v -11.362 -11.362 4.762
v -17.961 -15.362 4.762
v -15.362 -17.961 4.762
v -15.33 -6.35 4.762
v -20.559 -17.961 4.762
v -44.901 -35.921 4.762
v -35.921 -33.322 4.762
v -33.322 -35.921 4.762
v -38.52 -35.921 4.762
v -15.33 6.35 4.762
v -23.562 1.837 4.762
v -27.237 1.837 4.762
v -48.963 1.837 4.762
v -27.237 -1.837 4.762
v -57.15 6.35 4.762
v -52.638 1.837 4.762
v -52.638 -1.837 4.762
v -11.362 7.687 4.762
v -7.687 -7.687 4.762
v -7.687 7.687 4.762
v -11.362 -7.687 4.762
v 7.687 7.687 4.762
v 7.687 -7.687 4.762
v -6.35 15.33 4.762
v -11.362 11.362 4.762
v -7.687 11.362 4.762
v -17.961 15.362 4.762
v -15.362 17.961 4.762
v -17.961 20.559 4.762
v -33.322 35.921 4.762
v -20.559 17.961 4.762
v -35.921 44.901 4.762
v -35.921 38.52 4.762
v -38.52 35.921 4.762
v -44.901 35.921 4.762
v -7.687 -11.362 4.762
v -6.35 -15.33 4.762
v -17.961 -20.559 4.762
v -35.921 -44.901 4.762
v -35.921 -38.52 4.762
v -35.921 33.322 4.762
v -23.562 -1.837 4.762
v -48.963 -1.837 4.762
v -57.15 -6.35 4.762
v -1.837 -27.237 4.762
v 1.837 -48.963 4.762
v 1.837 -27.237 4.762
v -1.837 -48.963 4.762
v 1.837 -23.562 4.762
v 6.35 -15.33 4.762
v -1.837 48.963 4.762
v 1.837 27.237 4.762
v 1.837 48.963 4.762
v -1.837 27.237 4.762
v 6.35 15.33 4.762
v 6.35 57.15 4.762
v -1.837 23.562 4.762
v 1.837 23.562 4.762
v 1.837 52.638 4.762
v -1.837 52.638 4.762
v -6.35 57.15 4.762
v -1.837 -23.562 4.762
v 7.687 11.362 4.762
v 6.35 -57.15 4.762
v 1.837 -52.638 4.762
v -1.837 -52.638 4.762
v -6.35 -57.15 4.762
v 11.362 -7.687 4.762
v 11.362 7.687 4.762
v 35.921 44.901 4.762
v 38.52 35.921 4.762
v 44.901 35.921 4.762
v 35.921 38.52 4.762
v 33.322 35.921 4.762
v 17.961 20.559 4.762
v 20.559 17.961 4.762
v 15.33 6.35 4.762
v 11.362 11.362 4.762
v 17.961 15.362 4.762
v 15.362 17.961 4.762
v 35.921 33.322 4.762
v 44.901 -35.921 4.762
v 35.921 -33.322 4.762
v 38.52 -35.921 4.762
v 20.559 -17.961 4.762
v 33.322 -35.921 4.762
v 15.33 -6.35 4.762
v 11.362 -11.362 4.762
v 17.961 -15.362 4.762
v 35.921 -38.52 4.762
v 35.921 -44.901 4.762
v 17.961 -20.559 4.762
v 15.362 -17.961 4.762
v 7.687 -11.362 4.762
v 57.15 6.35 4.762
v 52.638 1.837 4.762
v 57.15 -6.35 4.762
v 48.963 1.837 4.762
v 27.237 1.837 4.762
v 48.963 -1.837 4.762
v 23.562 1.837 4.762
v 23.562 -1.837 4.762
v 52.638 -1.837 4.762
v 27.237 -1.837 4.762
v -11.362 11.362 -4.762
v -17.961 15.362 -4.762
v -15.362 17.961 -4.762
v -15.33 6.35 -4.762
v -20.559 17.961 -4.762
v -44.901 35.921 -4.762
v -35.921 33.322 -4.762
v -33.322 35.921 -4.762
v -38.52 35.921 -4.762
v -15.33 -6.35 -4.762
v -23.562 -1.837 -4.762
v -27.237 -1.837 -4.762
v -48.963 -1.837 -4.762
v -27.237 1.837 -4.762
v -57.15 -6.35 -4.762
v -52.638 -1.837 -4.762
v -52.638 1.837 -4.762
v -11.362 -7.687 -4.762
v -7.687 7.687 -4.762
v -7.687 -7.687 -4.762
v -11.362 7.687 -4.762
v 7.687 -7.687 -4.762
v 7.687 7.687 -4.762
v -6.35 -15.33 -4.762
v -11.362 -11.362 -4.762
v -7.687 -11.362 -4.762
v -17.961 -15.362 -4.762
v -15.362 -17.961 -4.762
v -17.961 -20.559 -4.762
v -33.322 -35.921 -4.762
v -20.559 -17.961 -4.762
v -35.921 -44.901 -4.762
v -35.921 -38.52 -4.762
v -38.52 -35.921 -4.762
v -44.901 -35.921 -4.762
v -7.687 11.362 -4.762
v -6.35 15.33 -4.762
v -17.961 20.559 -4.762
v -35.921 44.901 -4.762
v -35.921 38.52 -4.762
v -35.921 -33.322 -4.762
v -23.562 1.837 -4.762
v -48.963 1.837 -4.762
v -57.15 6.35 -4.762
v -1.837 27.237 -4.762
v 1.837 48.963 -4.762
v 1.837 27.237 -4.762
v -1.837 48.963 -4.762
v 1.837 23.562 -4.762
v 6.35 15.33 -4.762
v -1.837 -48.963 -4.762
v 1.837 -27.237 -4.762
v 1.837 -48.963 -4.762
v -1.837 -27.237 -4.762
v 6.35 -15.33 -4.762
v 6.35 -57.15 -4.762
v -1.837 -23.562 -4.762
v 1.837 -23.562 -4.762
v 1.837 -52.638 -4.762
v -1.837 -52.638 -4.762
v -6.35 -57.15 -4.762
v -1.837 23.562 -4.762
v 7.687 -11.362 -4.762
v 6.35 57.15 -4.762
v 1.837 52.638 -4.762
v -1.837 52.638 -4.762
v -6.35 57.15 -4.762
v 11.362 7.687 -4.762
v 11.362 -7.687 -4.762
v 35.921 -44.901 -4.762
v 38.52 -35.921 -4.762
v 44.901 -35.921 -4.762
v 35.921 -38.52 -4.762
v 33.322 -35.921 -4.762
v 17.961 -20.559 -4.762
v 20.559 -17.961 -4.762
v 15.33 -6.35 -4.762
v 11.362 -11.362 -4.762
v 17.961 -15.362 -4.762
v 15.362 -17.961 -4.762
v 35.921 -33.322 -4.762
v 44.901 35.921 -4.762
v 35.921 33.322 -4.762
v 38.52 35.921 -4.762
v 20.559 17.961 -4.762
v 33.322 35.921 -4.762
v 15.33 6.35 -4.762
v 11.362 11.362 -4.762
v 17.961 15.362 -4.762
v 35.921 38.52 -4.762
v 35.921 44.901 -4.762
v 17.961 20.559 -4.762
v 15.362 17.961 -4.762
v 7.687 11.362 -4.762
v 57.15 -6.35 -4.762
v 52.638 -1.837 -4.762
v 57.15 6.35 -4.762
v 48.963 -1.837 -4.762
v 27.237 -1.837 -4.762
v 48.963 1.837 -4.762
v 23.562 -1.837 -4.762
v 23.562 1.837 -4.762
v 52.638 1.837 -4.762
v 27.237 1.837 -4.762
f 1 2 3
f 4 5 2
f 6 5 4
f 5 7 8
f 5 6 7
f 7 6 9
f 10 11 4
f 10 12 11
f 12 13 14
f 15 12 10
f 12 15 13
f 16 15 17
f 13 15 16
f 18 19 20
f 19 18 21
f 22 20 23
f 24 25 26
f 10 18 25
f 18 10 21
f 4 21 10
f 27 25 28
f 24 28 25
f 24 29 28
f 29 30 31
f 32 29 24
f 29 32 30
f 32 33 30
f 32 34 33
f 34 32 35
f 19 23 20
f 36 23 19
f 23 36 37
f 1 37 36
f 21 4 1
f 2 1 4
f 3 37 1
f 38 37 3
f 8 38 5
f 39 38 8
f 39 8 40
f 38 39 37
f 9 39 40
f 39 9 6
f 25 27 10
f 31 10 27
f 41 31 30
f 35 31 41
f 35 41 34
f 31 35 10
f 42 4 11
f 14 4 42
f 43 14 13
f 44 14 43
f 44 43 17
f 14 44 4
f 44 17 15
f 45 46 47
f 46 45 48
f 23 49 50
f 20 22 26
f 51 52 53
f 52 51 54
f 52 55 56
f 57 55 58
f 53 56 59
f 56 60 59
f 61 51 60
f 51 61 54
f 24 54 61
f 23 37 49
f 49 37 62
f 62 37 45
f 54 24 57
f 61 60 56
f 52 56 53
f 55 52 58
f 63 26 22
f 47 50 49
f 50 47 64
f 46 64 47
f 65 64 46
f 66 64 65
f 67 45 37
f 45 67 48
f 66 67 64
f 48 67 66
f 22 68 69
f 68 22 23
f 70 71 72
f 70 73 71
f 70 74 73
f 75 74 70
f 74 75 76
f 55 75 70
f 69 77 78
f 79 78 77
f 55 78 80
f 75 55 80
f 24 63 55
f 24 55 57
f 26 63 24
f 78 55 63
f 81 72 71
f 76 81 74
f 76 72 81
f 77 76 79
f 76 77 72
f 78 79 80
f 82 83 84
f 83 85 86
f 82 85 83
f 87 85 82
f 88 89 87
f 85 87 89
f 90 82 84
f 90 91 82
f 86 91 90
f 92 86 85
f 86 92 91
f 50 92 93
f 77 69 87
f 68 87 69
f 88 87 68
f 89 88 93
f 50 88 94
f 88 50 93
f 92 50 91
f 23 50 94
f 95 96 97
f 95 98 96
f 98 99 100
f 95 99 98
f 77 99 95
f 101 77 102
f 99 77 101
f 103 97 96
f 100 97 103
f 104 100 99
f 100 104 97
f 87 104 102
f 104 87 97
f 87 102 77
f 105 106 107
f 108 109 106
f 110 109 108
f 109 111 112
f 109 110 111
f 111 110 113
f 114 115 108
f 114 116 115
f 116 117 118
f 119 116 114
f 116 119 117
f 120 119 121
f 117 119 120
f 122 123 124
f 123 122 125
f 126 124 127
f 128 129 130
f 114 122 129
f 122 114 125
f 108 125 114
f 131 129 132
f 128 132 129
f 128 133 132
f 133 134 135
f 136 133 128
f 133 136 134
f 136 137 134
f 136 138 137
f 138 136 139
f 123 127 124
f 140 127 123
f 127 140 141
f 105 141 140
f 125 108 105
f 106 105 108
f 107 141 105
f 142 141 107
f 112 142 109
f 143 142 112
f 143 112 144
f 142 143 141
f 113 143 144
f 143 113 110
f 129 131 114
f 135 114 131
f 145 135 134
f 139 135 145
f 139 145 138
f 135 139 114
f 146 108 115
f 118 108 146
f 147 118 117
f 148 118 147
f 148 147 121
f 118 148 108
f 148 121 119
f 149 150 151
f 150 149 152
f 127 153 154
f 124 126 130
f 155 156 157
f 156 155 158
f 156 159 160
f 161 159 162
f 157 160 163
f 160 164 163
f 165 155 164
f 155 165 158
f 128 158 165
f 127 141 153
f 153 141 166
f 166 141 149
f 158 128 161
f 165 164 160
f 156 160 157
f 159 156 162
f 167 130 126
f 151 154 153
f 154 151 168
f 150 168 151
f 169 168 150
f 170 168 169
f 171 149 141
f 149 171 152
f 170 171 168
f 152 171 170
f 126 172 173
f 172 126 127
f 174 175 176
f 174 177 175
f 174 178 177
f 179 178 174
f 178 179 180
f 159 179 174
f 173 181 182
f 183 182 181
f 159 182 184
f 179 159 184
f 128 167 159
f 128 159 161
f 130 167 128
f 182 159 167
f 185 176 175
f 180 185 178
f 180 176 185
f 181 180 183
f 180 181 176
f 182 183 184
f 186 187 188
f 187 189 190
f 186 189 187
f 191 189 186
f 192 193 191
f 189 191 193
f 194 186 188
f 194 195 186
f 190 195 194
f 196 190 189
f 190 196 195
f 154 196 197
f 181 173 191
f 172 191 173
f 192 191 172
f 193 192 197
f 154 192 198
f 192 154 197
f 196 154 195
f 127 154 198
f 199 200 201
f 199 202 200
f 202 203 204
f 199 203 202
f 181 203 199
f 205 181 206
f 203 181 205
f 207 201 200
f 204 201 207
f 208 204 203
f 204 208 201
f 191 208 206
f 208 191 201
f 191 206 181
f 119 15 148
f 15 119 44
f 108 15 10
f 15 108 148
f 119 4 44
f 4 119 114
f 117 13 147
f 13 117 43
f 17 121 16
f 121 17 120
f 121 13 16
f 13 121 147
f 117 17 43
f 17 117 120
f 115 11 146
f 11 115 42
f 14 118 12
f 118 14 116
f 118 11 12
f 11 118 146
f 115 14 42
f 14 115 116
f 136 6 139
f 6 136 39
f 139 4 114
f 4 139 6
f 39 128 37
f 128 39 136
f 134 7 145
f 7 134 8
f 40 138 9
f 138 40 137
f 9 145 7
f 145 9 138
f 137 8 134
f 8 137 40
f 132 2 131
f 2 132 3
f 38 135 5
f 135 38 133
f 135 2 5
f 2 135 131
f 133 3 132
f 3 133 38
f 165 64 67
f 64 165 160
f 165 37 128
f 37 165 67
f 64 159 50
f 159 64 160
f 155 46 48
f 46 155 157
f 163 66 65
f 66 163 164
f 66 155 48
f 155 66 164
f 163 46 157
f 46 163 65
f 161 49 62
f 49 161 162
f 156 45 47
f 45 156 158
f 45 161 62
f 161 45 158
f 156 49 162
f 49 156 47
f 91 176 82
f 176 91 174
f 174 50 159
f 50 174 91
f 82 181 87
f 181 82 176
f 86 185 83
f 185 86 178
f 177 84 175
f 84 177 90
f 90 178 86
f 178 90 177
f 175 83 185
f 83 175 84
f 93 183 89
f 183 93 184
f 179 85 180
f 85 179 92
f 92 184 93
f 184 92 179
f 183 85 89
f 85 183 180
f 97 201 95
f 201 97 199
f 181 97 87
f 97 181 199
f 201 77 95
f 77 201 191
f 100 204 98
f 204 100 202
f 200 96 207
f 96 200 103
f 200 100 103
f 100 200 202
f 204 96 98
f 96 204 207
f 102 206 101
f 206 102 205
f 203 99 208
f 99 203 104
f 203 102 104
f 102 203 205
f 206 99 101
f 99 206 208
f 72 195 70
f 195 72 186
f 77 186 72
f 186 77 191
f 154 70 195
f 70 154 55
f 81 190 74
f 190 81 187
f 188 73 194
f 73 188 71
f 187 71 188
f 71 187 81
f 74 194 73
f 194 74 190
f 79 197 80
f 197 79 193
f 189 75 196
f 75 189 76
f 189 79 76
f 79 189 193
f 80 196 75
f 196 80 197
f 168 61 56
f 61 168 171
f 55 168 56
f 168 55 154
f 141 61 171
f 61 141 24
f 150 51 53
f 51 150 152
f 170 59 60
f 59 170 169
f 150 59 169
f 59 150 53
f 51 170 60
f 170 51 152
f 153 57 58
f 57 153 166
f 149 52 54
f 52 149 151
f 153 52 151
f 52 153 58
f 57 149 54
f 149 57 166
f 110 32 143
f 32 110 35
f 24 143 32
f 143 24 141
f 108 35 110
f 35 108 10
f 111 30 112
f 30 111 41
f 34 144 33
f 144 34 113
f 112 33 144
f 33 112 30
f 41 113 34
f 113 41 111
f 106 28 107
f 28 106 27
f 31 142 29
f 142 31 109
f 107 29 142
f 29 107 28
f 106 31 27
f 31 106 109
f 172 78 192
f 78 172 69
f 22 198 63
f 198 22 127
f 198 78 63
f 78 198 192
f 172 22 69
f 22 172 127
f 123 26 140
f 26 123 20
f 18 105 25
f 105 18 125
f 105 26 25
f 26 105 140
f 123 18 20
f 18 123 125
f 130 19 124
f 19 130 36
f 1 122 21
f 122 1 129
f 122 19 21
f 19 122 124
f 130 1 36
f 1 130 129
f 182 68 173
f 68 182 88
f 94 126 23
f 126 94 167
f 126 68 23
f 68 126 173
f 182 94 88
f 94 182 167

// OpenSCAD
// file: common.scad
// this contains functions and parameters common to both arm and hub files.

// converts x in inches to x in mm.
function i2mm(x) = x * 0.0254 * 1000;

// distance from hub center to first arm mount point. must be less than second arm mount point.
function first_mount_radius() = i2mm(1);

// distance from hub center to second arm mount point. must be greater than first arm mount point.
function second_mount_radius() = i2mm(2);

// diameter of hole for fasteners between arm and hub.
function hole_diam() = i2mm(1/8) + 0.5;

function arm_width() = i2mm(0.5);
// main file
// Units are mm.

use <common.scad>;

arms = 8;

thickness = i2mm(.375);

// distance between general-purpose mounting holes arranged in a square.
gp_mount_dim = i2mm(0.75);
// minimum distance to edge from general-purpose mounting holes.
gp_mount_margin = i2mm(0.125);

module arm(angle) {
    L = second_mount_radius() + arm_width() / 2;
    rotate([0, 0, angle])
        difference() {
            translate([-L / 2, 0, 0])
                cube(size = [L, arm_width(), thickness], center = true);
            translate([-second_mount_radius(), 0, 0])
                cube(size = [hole_diam(), hole_diam(), 2 * thickness], center = true);
            translate([-first_mount_radius(), 0, 0])
                cube(size = [hole_diam(), hole_diam(), 2 * thickness], center = true);
        }
}

difference() {
    union() {
        for (i = [0: 1: arms])
            arm(i * 360 / arms);
        d = gp_mount_dim + 2 * gp_mount_margin + hole_diam();
        cube(size = [d, d, thickness], center = true);
    }
    translate([gp_mount_dim / 2, gp_mount_dim / 2, 0])
        cube(size = [hole_diam(), hole_diam(), 2 * thickness], center = true);
    translate([-gp_mount_dim / 2, gp_mount_dim / 2, 0])
        cube(size = [hole_diam(), hole_diam(), 2 * thickness], center = true);
    translate([-gp_mount_dim / 2, -gp_mount_dim / 2, 0])
        cube(size = [hole_diam(), hole_diam(), 2 * thickness], center = true);
    translate([gp_mount_dim / 2, -gp_mount_dim / 2, 0])
        cube(size = [hole_diam(), hole_diam(), 2 * thickness], center = true);
}
